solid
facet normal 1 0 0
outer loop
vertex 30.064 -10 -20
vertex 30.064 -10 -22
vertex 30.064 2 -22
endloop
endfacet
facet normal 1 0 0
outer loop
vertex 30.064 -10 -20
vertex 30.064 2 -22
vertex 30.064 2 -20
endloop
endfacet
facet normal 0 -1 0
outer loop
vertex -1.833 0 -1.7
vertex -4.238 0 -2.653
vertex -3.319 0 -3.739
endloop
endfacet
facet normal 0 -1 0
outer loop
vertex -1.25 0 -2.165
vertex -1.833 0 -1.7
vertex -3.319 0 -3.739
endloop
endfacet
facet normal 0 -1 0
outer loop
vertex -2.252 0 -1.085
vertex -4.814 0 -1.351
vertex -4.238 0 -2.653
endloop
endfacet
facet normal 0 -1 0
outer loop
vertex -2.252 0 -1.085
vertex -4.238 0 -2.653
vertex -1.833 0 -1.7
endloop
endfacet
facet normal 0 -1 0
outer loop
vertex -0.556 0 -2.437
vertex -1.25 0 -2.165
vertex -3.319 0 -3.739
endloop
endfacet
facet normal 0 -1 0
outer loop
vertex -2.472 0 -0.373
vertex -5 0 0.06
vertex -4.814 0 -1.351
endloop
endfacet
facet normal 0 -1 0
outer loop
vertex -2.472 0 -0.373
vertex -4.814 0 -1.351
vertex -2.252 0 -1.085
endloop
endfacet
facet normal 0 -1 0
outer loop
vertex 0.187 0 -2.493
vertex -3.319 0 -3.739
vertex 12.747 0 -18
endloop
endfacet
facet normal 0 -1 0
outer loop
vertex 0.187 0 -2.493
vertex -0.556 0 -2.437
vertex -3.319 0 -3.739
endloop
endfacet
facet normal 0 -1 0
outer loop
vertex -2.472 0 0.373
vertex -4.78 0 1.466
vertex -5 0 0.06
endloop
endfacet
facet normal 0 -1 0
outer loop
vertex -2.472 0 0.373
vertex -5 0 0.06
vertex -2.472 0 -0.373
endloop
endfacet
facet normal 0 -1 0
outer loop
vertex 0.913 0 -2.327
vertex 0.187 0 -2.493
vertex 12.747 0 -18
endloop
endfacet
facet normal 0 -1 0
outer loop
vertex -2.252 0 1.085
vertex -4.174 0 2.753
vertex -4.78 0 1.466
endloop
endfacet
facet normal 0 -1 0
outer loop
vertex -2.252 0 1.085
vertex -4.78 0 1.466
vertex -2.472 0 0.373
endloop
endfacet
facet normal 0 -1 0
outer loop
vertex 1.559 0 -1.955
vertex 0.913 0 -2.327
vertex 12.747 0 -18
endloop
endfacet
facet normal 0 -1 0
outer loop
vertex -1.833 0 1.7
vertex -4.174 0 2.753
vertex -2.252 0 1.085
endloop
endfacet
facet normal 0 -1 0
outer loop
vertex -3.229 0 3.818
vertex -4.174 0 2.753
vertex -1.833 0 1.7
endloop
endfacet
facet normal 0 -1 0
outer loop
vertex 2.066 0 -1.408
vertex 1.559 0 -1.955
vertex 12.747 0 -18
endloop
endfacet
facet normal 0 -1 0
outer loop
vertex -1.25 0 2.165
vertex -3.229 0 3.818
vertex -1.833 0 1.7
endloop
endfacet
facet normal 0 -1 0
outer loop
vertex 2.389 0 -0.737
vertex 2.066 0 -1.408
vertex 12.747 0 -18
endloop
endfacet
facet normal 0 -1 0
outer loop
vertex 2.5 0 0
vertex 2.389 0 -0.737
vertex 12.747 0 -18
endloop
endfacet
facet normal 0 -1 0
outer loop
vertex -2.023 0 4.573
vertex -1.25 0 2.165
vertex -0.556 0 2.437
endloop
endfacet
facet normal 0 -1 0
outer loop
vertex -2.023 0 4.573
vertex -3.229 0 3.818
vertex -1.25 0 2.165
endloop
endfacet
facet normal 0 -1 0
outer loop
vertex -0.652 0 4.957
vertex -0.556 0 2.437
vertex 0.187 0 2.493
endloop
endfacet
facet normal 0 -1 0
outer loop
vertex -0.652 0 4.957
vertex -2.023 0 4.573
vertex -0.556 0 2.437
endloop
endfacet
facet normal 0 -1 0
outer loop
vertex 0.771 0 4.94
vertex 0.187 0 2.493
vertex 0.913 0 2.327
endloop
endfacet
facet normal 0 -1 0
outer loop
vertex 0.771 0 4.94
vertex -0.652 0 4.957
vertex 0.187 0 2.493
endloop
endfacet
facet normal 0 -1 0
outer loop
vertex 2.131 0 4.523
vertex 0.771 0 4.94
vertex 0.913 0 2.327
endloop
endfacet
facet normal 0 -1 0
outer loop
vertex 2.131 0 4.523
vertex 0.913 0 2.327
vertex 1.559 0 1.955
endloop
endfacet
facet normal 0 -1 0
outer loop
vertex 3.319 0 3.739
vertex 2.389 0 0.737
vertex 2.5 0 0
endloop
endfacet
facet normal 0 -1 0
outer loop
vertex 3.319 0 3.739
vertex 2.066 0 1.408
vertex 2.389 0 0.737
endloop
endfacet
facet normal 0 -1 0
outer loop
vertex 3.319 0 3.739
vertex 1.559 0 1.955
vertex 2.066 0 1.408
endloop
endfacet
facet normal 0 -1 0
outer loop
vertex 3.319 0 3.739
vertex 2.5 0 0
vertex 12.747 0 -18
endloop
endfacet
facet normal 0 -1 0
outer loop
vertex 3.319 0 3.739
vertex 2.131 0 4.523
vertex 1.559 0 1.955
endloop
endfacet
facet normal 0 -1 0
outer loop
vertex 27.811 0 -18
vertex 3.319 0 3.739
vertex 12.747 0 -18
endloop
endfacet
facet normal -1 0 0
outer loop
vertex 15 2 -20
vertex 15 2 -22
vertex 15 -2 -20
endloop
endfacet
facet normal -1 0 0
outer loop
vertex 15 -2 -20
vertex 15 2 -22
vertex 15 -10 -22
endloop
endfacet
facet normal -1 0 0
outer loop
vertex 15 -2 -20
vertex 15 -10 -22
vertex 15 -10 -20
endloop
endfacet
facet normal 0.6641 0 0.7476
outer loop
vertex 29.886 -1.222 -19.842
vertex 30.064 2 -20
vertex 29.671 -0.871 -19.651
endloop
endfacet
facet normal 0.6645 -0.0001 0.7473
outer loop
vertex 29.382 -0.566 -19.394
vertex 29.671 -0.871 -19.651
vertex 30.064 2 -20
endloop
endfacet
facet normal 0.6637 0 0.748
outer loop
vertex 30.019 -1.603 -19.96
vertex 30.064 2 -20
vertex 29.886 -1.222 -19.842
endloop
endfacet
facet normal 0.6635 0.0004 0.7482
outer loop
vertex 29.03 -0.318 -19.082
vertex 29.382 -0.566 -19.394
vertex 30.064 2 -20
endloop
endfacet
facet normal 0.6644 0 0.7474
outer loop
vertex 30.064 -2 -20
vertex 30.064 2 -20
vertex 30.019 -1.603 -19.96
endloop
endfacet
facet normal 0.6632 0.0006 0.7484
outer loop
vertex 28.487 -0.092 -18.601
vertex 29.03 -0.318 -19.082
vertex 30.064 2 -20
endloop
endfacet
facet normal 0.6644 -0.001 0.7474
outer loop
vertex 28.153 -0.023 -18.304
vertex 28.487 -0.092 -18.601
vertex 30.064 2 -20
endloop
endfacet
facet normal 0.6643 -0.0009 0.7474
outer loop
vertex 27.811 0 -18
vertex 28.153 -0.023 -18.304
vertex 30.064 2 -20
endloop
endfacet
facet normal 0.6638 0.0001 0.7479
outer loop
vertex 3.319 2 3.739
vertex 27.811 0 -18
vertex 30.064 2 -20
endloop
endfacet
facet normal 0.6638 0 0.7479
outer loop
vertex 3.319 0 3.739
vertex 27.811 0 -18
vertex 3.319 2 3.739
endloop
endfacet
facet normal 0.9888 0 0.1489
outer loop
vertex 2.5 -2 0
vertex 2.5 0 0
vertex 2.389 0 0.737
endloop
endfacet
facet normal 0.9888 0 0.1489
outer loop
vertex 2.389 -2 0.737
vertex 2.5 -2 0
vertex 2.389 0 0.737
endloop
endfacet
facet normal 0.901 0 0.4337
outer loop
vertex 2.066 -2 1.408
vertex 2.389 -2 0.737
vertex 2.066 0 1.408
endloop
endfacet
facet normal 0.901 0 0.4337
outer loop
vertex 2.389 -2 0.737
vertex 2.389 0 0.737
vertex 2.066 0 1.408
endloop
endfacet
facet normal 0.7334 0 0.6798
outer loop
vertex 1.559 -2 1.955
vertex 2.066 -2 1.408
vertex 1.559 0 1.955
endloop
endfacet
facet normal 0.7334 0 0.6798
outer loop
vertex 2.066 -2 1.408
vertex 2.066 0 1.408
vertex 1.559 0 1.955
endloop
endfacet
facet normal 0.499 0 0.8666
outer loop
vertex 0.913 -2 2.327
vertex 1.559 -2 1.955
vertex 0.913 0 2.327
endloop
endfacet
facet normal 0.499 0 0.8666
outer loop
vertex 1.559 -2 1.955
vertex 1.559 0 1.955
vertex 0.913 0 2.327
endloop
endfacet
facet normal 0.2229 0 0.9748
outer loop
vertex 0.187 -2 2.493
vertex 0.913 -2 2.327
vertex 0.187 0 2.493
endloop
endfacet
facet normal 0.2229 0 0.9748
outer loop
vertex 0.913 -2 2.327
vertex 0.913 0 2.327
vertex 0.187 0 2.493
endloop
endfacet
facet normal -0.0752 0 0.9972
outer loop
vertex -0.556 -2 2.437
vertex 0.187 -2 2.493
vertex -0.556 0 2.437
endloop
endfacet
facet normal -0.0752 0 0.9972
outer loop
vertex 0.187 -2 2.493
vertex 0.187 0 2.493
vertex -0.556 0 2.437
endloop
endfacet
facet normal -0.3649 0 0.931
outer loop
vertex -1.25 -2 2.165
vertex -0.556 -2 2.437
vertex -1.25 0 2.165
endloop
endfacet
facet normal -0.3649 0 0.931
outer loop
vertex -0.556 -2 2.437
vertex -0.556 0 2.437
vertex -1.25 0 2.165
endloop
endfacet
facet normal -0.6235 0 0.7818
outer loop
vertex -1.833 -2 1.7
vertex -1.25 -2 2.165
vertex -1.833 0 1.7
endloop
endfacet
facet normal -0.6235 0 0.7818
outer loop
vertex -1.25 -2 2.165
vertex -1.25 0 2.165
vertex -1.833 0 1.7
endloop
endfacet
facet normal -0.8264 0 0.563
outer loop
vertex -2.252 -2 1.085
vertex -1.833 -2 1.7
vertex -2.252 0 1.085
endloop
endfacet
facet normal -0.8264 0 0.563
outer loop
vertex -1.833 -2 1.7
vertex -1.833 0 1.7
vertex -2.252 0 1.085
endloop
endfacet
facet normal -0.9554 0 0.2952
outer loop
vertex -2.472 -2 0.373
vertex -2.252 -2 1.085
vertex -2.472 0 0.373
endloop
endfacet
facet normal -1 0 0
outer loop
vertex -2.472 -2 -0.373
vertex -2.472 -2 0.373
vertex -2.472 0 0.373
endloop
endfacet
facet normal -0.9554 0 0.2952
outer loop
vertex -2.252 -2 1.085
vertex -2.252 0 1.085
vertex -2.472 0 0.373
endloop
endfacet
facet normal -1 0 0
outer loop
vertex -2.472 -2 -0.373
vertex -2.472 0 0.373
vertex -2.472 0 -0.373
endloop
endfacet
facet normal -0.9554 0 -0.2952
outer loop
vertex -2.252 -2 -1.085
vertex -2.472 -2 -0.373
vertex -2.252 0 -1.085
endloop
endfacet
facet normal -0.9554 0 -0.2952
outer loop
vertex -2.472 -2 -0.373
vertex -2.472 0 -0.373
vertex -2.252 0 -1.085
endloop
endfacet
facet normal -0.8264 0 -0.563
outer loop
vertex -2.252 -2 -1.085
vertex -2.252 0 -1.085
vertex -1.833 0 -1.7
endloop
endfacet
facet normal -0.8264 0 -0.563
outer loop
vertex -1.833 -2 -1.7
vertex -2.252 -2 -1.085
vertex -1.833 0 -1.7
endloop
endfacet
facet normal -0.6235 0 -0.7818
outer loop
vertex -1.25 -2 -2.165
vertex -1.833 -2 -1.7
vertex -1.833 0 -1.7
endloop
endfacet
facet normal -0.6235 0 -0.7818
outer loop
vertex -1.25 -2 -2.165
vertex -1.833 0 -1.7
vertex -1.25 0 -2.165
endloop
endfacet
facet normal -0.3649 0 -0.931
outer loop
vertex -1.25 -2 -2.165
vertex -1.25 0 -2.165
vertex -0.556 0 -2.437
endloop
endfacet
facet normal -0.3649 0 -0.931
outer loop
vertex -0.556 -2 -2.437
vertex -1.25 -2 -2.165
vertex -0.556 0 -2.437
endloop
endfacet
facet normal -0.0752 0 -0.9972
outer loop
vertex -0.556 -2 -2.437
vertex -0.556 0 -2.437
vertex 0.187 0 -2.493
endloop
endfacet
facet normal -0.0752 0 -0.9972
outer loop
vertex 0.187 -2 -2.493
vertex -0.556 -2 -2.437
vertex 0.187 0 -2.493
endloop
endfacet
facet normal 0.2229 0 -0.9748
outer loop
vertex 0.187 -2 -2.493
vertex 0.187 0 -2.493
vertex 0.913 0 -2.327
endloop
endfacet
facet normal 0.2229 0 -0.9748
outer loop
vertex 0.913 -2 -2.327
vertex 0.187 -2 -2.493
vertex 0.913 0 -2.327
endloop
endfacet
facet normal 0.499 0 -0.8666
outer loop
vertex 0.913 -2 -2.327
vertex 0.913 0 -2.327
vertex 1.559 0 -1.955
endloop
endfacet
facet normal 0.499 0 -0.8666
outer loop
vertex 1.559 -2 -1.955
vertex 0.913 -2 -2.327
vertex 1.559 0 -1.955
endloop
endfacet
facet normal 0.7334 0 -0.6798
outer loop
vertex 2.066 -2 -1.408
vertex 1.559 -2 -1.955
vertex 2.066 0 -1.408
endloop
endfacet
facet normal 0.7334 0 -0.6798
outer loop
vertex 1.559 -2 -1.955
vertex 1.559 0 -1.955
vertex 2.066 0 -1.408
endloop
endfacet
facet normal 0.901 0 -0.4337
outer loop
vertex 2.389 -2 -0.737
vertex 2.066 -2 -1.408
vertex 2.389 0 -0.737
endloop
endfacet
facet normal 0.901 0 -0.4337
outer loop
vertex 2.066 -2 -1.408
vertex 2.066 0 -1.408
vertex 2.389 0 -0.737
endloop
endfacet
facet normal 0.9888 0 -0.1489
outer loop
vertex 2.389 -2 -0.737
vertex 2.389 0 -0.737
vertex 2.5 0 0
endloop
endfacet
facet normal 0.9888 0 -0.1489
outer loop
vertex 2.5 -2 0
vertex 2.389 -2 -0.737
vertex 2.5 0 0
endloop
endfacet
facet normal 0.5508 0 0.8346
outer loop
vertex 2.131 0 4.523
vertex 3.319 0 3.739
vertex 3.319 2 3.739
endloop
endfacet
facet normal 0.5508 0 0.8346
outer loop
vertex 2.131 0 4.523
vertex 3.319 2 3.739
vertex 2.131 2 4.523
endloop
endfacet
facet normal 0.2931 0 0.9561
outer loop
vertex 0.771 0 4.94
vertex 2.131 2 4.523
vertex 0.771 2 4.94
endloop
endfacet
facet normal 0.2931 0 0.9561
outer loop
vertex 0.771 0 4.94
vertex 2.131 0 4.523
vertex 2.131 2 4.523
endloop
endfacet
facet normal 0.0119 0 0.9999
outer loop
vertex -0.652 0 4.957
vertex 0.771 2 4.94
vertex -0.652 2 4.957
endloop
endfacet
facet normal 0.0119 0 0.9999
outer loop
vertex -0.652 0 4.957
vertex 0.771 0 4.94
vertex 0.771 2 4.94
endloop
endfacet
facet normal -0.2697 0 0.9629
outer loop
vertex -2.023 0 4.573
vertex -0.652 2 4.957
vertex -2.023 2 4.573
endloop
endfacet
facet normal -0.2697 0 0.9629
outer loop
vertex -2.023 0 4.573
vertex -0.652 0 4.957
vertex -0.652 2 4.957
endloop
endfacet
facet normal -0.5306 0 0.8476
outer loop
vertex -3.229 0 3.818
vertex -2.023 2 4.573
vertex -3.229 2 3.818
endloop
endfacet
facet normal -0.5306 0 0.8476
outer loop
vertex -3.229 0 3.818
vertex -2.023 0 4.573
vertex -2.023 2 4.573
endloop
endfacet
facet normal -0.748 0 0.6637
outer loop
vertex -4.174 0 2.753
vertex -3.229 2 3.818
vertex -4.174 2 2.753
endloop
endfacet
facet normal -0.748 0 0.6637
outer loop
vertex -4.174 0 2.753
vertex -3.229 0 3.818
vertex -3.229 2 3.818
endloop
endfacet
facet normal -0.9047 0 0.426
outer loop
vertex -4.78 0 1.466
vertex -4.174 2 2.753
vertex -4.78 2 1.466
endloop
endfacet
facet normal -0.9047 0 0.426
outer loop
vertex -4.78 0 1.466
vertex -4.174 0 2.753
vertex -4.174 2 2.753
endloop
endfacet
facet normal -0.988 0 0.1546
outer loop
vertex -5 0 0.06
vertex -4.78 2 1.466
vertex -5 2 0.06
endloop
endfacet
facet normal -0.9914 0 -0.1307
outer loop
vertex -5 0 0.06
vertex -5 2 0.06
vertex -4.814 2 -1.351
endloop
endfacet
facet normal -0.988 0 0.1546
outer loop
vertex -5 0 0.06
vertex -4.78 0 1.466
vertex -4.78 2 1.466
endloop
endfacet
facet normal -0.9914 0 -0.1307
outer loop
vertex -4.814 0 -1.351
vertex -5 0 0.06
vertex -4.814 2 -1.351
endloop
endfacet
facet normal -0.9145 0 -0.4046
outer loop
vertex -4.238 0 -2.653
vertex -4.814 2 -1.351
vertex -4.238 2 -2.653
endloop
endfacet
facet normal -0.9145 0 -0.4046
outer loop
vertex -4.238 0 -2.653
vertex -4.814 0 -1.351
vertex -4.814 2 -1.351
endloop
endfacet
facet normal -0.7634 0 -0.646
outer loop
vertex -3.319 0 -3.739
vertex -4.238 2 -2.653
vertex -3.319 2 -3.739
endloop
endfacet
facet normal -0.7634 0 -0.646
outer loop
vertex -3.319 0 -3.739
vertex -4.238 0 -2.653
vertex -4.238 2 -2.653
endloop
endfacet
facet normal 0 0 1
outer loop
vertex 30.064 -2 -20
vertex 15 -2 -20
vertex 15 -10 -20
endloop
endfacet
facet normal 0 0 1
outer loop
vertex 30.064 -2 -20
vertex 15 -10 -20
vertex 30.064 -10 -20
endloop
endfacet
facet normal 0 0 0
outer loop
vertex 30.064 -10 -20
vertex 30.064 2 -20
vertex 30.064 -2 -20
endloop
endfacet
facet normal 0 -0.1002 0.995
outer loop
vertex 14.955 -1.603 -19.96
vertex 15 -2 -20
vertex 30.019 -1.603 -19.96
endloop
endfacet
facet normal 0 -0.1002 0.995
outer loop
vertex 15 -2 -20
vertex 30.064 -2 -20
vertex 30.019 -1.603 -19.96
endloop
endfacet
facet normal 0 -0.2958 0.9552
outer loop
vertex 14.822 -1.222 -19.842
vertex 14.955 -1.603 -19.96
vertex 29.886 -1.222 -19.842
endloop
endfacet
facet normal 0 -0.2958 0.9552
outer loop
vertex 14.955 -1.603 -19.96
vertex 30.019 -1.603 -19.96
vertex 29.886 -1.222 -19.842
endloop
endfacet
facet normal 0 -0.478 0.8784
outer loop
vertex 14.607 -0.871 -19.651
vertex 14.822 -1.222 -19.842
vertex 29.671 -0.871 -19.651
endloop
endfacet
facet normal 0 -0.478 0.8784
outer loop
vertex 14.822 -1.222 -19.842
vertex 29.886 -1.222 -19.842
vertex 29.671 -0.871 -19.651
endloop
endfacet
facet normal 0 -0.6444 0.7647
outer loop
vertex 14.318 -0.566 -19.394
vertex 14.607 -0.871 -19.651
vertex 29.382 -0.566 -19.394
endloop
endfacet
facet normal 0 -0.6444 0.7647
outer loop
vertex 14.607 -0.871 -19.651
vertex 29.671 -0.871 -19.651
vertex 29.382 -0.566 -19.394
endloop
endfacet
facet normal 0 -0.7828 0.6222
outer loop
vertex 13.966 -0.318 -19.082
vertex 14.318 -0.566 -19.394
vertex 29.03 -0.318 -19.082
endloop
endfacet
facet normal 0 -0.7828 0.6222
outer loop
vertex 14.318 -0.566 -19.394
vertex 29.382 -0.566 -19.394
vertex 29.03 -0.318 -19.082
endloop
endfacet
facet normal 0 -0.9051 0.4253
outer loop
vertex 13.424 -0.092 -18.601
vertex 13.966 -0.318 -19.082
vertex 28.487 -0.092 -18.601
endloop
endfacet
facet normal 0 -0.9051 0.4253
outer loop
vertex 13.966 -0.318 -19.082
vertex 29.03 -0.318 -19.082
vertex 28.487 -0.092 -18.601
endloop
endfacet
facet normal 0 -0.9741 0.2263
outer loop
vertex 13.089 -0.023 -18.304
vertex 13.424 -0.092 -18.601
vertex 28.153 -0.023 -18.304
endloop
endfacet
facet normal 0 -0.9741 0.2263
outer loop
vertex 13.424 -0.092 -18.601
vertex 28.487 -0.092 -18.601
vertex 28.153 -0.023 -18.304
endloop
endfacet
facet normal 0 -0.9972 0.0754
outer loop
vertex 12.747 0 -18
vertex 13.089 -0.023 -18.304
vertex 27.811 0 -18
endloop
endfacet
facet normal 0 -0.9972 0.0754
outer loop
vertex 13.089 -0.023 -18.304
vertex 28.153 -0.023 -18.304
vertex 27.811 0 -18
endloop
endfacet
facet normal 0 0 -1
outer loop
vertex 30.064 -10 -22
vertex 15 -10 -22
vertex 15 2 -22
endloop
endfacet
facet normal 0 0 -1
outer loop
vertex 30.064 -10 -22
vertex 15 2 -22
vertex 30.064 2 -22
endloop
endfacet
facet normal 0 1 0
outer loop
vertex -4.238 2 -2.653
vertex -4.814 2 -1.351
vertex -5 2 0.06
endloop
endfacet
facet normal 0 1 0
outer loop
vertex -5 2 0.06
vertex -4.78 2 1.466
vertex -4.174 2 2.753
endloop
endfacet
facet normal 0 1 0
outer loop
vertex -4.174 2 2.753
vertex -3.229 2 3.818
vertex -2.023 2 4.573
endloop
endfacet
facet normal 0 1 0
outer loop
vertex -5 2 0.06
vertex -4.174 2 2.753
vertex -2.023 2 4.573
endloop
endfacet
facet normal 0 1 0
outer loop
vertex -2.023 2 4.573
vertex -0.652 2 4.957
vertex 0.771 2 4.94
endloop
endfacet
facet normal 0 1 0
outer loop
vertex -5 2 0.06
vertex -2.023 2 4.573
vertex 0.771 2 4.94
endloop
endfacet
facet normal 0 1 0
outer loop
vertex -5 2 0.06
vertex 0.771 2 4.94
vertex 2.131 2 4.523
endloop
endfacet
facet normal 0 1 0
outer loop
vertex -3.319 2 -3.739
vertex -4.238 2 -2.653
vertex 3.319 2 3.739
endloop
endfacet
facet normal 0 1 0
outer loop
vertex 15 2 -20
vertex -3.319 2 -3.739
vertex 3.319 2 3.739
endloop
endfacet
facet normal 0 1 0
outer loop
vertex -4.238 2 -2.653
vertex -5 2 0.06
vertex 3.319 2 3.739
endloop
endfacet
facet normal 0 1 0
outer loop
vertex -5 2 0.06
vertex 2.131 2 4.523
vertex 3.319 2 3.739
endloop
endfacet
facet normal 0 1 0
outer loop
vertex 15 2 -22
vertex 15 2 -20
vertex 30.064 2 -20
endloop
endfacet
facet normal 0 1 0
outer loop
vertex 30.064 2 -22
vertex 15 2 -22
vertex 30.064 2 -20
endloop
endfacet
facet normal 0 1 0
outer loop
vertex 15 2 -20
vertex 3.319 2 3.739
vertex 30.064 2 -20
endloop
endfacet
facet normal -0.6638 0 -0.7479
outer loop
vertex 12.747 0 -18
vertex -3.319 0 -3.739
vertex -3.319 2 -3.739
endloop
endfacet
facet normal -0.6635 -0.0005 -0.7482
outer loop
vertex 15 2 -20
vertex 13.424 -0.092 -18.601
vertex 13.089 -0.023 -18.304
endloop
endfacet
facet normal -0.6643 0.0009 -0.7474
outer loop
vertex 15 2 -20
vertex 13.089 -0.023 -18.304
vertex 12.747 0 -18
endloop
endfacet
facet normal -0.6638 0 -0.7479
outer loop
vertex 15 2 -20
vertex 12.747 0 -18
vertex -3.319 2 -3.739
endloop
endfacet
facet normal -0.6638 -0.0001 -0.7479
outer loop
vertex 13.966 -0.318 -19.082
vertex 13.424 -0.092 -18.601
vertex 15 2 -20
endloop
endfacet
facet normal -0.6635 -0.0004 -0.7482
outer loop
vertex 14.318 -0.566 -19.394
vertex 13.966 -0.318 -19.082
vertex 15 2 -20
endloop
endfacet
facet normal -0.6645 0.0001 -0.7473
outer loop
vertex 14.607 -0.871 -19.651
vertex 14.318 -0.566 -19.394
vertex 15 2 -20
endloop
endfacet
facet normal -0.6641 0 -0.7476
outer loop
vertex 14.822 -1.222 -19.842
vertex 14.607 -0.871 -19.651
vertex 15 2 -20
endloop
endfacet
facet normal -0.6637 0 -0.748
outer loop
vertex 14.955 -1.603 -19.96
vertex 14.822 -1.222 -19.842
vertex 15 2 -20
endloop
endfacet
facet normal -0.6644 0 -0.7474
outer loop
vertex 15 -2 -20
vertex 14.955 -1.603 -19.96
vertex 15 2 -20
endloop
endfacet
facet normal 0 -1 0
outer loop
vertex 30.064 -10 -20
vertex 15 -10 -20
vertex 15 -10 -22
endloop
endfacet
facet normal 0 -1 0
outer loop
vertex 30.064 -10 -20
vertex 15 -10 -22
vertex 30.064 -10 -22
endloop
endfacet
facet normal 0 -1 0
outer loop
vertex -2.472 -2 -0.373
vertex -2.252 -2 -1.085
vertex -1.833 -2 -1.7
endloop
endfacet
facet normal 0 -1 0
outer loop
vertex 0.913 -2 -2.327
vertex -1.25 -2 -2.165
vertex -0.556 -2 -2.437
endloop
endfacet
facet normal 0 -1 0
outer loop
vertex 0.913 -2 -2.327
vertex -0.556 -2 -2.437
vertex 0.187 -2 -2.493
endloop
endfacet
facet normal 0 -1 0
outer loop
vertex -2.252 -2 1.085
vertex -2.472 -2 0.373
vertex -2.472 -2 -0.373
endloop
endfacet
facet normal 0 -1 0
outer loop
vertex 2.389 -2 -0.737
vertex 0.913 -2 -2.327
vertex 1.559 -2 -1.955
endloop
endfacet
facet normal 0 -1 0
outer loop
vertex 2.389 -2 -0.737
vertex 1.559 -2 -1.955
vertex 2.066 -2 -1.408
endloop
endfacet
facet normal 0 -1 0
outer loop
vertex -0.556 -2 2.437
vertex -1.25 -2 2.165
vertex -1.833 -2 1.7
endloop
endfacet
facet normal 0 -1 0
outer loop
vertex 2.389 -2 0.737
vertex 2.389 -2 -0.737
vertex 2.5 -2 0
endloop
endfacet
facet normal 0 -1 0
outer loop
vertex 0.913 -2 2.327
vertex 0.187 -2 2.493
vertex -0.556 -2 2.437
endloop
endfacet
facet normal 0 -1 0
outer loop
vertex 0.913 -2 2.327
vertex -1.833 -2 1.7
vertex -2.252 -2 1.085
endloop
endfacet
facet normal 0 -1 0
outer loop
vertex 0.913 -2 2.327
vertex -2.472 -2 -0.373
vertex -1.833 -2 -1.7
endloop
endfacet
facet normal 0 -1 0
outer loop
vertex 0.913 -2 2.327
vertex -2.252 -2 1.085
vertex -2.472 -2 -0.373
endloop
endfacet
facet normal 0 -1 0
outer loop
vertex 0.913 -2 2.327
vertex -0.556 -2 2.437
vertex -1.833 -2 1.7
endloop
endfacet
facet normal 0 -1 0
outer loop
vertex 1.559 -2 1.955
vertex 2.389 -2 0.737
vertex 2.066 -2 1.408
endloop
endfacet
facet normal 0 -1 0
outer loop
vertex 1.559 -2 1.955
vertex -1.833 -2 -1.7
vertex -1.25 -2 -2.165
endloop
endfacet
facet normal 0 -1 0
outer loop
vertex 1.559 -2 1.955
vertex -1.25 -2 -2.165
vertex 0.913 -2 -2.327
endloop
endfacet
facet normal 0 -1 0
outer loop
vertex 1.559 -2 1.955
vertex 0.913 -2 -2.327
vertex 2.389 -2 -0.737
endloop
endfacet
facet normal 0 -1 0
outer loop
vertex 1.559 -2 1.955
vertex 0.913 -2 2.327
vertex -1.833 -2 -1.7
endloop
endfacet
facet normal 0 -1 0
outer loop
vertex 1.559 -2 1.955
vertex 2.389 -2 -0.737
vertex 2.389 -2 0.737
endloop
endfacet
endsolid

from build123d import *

# Parameters (mm, degrees)
F0_R          = 2.5
F1_DEPTH      = 2
F0_W          = 15.064
F0_H          = 2
F2_DEPTH      = 10
F2_DEPTH_BACK = 2
F3_DEPTH      = 2
F3_DEPTH_BACK = 2
F4_R          = 2


# Not quite as in the source:
# - ends of sketch curves that miss each other by under 0.0002 mm in the source are joined


with BuildPart() as f1:
    # F0 (on Front) → F1 (new body)
    with BuildSketch(Plane.XZ):
        with BuildLine():
            Line((30.0639452948, -20), (3.3191835885, 3.7393876913))
            ThreePointArc((3.3191835885, 3.7393876913), (-3.7393876913, 3.3191835885), (-3.3191835885, -3.7393876913))
            Line((-3.3191835885, -3.7393876913), (15, -20))
            Line((15, -20), (30.0639452948, -20))
        make_face()
        Circle(F0_R, mode=Mode.SUBTRACT)
    extrude(amount=-F1_DEPTH)

    # F0 (on Front) → F2 (join, two sides)
    with BuildSketch(Plane.XZ) as f2_sk:
        with Locations((22.532, -21)):
            Rectangle(F0_W, F0_H)
    extrude(amount=F2_DEPTH)
    extrude(f2_sk.sketch, amount=-F2_DEPTH_BACK)

    # F0 (on Front) → F3 (join, two sides)
    with BuildSketch(Plane.XZ) as f3_sk:
        Circle(F0_R)
    extrude(amount=F3_DEPTH)
    extrude(f3_sk.sketch, amount=-F3_DEPTH_BACK)

    # F4
    f4_edges = [f1.edges().sort_by_distance(p)[0] for p in [
        (22.531973, 0, -20),
    ]]
    fillet(f4_edges, radius=F4_R)


solid = f1.part
